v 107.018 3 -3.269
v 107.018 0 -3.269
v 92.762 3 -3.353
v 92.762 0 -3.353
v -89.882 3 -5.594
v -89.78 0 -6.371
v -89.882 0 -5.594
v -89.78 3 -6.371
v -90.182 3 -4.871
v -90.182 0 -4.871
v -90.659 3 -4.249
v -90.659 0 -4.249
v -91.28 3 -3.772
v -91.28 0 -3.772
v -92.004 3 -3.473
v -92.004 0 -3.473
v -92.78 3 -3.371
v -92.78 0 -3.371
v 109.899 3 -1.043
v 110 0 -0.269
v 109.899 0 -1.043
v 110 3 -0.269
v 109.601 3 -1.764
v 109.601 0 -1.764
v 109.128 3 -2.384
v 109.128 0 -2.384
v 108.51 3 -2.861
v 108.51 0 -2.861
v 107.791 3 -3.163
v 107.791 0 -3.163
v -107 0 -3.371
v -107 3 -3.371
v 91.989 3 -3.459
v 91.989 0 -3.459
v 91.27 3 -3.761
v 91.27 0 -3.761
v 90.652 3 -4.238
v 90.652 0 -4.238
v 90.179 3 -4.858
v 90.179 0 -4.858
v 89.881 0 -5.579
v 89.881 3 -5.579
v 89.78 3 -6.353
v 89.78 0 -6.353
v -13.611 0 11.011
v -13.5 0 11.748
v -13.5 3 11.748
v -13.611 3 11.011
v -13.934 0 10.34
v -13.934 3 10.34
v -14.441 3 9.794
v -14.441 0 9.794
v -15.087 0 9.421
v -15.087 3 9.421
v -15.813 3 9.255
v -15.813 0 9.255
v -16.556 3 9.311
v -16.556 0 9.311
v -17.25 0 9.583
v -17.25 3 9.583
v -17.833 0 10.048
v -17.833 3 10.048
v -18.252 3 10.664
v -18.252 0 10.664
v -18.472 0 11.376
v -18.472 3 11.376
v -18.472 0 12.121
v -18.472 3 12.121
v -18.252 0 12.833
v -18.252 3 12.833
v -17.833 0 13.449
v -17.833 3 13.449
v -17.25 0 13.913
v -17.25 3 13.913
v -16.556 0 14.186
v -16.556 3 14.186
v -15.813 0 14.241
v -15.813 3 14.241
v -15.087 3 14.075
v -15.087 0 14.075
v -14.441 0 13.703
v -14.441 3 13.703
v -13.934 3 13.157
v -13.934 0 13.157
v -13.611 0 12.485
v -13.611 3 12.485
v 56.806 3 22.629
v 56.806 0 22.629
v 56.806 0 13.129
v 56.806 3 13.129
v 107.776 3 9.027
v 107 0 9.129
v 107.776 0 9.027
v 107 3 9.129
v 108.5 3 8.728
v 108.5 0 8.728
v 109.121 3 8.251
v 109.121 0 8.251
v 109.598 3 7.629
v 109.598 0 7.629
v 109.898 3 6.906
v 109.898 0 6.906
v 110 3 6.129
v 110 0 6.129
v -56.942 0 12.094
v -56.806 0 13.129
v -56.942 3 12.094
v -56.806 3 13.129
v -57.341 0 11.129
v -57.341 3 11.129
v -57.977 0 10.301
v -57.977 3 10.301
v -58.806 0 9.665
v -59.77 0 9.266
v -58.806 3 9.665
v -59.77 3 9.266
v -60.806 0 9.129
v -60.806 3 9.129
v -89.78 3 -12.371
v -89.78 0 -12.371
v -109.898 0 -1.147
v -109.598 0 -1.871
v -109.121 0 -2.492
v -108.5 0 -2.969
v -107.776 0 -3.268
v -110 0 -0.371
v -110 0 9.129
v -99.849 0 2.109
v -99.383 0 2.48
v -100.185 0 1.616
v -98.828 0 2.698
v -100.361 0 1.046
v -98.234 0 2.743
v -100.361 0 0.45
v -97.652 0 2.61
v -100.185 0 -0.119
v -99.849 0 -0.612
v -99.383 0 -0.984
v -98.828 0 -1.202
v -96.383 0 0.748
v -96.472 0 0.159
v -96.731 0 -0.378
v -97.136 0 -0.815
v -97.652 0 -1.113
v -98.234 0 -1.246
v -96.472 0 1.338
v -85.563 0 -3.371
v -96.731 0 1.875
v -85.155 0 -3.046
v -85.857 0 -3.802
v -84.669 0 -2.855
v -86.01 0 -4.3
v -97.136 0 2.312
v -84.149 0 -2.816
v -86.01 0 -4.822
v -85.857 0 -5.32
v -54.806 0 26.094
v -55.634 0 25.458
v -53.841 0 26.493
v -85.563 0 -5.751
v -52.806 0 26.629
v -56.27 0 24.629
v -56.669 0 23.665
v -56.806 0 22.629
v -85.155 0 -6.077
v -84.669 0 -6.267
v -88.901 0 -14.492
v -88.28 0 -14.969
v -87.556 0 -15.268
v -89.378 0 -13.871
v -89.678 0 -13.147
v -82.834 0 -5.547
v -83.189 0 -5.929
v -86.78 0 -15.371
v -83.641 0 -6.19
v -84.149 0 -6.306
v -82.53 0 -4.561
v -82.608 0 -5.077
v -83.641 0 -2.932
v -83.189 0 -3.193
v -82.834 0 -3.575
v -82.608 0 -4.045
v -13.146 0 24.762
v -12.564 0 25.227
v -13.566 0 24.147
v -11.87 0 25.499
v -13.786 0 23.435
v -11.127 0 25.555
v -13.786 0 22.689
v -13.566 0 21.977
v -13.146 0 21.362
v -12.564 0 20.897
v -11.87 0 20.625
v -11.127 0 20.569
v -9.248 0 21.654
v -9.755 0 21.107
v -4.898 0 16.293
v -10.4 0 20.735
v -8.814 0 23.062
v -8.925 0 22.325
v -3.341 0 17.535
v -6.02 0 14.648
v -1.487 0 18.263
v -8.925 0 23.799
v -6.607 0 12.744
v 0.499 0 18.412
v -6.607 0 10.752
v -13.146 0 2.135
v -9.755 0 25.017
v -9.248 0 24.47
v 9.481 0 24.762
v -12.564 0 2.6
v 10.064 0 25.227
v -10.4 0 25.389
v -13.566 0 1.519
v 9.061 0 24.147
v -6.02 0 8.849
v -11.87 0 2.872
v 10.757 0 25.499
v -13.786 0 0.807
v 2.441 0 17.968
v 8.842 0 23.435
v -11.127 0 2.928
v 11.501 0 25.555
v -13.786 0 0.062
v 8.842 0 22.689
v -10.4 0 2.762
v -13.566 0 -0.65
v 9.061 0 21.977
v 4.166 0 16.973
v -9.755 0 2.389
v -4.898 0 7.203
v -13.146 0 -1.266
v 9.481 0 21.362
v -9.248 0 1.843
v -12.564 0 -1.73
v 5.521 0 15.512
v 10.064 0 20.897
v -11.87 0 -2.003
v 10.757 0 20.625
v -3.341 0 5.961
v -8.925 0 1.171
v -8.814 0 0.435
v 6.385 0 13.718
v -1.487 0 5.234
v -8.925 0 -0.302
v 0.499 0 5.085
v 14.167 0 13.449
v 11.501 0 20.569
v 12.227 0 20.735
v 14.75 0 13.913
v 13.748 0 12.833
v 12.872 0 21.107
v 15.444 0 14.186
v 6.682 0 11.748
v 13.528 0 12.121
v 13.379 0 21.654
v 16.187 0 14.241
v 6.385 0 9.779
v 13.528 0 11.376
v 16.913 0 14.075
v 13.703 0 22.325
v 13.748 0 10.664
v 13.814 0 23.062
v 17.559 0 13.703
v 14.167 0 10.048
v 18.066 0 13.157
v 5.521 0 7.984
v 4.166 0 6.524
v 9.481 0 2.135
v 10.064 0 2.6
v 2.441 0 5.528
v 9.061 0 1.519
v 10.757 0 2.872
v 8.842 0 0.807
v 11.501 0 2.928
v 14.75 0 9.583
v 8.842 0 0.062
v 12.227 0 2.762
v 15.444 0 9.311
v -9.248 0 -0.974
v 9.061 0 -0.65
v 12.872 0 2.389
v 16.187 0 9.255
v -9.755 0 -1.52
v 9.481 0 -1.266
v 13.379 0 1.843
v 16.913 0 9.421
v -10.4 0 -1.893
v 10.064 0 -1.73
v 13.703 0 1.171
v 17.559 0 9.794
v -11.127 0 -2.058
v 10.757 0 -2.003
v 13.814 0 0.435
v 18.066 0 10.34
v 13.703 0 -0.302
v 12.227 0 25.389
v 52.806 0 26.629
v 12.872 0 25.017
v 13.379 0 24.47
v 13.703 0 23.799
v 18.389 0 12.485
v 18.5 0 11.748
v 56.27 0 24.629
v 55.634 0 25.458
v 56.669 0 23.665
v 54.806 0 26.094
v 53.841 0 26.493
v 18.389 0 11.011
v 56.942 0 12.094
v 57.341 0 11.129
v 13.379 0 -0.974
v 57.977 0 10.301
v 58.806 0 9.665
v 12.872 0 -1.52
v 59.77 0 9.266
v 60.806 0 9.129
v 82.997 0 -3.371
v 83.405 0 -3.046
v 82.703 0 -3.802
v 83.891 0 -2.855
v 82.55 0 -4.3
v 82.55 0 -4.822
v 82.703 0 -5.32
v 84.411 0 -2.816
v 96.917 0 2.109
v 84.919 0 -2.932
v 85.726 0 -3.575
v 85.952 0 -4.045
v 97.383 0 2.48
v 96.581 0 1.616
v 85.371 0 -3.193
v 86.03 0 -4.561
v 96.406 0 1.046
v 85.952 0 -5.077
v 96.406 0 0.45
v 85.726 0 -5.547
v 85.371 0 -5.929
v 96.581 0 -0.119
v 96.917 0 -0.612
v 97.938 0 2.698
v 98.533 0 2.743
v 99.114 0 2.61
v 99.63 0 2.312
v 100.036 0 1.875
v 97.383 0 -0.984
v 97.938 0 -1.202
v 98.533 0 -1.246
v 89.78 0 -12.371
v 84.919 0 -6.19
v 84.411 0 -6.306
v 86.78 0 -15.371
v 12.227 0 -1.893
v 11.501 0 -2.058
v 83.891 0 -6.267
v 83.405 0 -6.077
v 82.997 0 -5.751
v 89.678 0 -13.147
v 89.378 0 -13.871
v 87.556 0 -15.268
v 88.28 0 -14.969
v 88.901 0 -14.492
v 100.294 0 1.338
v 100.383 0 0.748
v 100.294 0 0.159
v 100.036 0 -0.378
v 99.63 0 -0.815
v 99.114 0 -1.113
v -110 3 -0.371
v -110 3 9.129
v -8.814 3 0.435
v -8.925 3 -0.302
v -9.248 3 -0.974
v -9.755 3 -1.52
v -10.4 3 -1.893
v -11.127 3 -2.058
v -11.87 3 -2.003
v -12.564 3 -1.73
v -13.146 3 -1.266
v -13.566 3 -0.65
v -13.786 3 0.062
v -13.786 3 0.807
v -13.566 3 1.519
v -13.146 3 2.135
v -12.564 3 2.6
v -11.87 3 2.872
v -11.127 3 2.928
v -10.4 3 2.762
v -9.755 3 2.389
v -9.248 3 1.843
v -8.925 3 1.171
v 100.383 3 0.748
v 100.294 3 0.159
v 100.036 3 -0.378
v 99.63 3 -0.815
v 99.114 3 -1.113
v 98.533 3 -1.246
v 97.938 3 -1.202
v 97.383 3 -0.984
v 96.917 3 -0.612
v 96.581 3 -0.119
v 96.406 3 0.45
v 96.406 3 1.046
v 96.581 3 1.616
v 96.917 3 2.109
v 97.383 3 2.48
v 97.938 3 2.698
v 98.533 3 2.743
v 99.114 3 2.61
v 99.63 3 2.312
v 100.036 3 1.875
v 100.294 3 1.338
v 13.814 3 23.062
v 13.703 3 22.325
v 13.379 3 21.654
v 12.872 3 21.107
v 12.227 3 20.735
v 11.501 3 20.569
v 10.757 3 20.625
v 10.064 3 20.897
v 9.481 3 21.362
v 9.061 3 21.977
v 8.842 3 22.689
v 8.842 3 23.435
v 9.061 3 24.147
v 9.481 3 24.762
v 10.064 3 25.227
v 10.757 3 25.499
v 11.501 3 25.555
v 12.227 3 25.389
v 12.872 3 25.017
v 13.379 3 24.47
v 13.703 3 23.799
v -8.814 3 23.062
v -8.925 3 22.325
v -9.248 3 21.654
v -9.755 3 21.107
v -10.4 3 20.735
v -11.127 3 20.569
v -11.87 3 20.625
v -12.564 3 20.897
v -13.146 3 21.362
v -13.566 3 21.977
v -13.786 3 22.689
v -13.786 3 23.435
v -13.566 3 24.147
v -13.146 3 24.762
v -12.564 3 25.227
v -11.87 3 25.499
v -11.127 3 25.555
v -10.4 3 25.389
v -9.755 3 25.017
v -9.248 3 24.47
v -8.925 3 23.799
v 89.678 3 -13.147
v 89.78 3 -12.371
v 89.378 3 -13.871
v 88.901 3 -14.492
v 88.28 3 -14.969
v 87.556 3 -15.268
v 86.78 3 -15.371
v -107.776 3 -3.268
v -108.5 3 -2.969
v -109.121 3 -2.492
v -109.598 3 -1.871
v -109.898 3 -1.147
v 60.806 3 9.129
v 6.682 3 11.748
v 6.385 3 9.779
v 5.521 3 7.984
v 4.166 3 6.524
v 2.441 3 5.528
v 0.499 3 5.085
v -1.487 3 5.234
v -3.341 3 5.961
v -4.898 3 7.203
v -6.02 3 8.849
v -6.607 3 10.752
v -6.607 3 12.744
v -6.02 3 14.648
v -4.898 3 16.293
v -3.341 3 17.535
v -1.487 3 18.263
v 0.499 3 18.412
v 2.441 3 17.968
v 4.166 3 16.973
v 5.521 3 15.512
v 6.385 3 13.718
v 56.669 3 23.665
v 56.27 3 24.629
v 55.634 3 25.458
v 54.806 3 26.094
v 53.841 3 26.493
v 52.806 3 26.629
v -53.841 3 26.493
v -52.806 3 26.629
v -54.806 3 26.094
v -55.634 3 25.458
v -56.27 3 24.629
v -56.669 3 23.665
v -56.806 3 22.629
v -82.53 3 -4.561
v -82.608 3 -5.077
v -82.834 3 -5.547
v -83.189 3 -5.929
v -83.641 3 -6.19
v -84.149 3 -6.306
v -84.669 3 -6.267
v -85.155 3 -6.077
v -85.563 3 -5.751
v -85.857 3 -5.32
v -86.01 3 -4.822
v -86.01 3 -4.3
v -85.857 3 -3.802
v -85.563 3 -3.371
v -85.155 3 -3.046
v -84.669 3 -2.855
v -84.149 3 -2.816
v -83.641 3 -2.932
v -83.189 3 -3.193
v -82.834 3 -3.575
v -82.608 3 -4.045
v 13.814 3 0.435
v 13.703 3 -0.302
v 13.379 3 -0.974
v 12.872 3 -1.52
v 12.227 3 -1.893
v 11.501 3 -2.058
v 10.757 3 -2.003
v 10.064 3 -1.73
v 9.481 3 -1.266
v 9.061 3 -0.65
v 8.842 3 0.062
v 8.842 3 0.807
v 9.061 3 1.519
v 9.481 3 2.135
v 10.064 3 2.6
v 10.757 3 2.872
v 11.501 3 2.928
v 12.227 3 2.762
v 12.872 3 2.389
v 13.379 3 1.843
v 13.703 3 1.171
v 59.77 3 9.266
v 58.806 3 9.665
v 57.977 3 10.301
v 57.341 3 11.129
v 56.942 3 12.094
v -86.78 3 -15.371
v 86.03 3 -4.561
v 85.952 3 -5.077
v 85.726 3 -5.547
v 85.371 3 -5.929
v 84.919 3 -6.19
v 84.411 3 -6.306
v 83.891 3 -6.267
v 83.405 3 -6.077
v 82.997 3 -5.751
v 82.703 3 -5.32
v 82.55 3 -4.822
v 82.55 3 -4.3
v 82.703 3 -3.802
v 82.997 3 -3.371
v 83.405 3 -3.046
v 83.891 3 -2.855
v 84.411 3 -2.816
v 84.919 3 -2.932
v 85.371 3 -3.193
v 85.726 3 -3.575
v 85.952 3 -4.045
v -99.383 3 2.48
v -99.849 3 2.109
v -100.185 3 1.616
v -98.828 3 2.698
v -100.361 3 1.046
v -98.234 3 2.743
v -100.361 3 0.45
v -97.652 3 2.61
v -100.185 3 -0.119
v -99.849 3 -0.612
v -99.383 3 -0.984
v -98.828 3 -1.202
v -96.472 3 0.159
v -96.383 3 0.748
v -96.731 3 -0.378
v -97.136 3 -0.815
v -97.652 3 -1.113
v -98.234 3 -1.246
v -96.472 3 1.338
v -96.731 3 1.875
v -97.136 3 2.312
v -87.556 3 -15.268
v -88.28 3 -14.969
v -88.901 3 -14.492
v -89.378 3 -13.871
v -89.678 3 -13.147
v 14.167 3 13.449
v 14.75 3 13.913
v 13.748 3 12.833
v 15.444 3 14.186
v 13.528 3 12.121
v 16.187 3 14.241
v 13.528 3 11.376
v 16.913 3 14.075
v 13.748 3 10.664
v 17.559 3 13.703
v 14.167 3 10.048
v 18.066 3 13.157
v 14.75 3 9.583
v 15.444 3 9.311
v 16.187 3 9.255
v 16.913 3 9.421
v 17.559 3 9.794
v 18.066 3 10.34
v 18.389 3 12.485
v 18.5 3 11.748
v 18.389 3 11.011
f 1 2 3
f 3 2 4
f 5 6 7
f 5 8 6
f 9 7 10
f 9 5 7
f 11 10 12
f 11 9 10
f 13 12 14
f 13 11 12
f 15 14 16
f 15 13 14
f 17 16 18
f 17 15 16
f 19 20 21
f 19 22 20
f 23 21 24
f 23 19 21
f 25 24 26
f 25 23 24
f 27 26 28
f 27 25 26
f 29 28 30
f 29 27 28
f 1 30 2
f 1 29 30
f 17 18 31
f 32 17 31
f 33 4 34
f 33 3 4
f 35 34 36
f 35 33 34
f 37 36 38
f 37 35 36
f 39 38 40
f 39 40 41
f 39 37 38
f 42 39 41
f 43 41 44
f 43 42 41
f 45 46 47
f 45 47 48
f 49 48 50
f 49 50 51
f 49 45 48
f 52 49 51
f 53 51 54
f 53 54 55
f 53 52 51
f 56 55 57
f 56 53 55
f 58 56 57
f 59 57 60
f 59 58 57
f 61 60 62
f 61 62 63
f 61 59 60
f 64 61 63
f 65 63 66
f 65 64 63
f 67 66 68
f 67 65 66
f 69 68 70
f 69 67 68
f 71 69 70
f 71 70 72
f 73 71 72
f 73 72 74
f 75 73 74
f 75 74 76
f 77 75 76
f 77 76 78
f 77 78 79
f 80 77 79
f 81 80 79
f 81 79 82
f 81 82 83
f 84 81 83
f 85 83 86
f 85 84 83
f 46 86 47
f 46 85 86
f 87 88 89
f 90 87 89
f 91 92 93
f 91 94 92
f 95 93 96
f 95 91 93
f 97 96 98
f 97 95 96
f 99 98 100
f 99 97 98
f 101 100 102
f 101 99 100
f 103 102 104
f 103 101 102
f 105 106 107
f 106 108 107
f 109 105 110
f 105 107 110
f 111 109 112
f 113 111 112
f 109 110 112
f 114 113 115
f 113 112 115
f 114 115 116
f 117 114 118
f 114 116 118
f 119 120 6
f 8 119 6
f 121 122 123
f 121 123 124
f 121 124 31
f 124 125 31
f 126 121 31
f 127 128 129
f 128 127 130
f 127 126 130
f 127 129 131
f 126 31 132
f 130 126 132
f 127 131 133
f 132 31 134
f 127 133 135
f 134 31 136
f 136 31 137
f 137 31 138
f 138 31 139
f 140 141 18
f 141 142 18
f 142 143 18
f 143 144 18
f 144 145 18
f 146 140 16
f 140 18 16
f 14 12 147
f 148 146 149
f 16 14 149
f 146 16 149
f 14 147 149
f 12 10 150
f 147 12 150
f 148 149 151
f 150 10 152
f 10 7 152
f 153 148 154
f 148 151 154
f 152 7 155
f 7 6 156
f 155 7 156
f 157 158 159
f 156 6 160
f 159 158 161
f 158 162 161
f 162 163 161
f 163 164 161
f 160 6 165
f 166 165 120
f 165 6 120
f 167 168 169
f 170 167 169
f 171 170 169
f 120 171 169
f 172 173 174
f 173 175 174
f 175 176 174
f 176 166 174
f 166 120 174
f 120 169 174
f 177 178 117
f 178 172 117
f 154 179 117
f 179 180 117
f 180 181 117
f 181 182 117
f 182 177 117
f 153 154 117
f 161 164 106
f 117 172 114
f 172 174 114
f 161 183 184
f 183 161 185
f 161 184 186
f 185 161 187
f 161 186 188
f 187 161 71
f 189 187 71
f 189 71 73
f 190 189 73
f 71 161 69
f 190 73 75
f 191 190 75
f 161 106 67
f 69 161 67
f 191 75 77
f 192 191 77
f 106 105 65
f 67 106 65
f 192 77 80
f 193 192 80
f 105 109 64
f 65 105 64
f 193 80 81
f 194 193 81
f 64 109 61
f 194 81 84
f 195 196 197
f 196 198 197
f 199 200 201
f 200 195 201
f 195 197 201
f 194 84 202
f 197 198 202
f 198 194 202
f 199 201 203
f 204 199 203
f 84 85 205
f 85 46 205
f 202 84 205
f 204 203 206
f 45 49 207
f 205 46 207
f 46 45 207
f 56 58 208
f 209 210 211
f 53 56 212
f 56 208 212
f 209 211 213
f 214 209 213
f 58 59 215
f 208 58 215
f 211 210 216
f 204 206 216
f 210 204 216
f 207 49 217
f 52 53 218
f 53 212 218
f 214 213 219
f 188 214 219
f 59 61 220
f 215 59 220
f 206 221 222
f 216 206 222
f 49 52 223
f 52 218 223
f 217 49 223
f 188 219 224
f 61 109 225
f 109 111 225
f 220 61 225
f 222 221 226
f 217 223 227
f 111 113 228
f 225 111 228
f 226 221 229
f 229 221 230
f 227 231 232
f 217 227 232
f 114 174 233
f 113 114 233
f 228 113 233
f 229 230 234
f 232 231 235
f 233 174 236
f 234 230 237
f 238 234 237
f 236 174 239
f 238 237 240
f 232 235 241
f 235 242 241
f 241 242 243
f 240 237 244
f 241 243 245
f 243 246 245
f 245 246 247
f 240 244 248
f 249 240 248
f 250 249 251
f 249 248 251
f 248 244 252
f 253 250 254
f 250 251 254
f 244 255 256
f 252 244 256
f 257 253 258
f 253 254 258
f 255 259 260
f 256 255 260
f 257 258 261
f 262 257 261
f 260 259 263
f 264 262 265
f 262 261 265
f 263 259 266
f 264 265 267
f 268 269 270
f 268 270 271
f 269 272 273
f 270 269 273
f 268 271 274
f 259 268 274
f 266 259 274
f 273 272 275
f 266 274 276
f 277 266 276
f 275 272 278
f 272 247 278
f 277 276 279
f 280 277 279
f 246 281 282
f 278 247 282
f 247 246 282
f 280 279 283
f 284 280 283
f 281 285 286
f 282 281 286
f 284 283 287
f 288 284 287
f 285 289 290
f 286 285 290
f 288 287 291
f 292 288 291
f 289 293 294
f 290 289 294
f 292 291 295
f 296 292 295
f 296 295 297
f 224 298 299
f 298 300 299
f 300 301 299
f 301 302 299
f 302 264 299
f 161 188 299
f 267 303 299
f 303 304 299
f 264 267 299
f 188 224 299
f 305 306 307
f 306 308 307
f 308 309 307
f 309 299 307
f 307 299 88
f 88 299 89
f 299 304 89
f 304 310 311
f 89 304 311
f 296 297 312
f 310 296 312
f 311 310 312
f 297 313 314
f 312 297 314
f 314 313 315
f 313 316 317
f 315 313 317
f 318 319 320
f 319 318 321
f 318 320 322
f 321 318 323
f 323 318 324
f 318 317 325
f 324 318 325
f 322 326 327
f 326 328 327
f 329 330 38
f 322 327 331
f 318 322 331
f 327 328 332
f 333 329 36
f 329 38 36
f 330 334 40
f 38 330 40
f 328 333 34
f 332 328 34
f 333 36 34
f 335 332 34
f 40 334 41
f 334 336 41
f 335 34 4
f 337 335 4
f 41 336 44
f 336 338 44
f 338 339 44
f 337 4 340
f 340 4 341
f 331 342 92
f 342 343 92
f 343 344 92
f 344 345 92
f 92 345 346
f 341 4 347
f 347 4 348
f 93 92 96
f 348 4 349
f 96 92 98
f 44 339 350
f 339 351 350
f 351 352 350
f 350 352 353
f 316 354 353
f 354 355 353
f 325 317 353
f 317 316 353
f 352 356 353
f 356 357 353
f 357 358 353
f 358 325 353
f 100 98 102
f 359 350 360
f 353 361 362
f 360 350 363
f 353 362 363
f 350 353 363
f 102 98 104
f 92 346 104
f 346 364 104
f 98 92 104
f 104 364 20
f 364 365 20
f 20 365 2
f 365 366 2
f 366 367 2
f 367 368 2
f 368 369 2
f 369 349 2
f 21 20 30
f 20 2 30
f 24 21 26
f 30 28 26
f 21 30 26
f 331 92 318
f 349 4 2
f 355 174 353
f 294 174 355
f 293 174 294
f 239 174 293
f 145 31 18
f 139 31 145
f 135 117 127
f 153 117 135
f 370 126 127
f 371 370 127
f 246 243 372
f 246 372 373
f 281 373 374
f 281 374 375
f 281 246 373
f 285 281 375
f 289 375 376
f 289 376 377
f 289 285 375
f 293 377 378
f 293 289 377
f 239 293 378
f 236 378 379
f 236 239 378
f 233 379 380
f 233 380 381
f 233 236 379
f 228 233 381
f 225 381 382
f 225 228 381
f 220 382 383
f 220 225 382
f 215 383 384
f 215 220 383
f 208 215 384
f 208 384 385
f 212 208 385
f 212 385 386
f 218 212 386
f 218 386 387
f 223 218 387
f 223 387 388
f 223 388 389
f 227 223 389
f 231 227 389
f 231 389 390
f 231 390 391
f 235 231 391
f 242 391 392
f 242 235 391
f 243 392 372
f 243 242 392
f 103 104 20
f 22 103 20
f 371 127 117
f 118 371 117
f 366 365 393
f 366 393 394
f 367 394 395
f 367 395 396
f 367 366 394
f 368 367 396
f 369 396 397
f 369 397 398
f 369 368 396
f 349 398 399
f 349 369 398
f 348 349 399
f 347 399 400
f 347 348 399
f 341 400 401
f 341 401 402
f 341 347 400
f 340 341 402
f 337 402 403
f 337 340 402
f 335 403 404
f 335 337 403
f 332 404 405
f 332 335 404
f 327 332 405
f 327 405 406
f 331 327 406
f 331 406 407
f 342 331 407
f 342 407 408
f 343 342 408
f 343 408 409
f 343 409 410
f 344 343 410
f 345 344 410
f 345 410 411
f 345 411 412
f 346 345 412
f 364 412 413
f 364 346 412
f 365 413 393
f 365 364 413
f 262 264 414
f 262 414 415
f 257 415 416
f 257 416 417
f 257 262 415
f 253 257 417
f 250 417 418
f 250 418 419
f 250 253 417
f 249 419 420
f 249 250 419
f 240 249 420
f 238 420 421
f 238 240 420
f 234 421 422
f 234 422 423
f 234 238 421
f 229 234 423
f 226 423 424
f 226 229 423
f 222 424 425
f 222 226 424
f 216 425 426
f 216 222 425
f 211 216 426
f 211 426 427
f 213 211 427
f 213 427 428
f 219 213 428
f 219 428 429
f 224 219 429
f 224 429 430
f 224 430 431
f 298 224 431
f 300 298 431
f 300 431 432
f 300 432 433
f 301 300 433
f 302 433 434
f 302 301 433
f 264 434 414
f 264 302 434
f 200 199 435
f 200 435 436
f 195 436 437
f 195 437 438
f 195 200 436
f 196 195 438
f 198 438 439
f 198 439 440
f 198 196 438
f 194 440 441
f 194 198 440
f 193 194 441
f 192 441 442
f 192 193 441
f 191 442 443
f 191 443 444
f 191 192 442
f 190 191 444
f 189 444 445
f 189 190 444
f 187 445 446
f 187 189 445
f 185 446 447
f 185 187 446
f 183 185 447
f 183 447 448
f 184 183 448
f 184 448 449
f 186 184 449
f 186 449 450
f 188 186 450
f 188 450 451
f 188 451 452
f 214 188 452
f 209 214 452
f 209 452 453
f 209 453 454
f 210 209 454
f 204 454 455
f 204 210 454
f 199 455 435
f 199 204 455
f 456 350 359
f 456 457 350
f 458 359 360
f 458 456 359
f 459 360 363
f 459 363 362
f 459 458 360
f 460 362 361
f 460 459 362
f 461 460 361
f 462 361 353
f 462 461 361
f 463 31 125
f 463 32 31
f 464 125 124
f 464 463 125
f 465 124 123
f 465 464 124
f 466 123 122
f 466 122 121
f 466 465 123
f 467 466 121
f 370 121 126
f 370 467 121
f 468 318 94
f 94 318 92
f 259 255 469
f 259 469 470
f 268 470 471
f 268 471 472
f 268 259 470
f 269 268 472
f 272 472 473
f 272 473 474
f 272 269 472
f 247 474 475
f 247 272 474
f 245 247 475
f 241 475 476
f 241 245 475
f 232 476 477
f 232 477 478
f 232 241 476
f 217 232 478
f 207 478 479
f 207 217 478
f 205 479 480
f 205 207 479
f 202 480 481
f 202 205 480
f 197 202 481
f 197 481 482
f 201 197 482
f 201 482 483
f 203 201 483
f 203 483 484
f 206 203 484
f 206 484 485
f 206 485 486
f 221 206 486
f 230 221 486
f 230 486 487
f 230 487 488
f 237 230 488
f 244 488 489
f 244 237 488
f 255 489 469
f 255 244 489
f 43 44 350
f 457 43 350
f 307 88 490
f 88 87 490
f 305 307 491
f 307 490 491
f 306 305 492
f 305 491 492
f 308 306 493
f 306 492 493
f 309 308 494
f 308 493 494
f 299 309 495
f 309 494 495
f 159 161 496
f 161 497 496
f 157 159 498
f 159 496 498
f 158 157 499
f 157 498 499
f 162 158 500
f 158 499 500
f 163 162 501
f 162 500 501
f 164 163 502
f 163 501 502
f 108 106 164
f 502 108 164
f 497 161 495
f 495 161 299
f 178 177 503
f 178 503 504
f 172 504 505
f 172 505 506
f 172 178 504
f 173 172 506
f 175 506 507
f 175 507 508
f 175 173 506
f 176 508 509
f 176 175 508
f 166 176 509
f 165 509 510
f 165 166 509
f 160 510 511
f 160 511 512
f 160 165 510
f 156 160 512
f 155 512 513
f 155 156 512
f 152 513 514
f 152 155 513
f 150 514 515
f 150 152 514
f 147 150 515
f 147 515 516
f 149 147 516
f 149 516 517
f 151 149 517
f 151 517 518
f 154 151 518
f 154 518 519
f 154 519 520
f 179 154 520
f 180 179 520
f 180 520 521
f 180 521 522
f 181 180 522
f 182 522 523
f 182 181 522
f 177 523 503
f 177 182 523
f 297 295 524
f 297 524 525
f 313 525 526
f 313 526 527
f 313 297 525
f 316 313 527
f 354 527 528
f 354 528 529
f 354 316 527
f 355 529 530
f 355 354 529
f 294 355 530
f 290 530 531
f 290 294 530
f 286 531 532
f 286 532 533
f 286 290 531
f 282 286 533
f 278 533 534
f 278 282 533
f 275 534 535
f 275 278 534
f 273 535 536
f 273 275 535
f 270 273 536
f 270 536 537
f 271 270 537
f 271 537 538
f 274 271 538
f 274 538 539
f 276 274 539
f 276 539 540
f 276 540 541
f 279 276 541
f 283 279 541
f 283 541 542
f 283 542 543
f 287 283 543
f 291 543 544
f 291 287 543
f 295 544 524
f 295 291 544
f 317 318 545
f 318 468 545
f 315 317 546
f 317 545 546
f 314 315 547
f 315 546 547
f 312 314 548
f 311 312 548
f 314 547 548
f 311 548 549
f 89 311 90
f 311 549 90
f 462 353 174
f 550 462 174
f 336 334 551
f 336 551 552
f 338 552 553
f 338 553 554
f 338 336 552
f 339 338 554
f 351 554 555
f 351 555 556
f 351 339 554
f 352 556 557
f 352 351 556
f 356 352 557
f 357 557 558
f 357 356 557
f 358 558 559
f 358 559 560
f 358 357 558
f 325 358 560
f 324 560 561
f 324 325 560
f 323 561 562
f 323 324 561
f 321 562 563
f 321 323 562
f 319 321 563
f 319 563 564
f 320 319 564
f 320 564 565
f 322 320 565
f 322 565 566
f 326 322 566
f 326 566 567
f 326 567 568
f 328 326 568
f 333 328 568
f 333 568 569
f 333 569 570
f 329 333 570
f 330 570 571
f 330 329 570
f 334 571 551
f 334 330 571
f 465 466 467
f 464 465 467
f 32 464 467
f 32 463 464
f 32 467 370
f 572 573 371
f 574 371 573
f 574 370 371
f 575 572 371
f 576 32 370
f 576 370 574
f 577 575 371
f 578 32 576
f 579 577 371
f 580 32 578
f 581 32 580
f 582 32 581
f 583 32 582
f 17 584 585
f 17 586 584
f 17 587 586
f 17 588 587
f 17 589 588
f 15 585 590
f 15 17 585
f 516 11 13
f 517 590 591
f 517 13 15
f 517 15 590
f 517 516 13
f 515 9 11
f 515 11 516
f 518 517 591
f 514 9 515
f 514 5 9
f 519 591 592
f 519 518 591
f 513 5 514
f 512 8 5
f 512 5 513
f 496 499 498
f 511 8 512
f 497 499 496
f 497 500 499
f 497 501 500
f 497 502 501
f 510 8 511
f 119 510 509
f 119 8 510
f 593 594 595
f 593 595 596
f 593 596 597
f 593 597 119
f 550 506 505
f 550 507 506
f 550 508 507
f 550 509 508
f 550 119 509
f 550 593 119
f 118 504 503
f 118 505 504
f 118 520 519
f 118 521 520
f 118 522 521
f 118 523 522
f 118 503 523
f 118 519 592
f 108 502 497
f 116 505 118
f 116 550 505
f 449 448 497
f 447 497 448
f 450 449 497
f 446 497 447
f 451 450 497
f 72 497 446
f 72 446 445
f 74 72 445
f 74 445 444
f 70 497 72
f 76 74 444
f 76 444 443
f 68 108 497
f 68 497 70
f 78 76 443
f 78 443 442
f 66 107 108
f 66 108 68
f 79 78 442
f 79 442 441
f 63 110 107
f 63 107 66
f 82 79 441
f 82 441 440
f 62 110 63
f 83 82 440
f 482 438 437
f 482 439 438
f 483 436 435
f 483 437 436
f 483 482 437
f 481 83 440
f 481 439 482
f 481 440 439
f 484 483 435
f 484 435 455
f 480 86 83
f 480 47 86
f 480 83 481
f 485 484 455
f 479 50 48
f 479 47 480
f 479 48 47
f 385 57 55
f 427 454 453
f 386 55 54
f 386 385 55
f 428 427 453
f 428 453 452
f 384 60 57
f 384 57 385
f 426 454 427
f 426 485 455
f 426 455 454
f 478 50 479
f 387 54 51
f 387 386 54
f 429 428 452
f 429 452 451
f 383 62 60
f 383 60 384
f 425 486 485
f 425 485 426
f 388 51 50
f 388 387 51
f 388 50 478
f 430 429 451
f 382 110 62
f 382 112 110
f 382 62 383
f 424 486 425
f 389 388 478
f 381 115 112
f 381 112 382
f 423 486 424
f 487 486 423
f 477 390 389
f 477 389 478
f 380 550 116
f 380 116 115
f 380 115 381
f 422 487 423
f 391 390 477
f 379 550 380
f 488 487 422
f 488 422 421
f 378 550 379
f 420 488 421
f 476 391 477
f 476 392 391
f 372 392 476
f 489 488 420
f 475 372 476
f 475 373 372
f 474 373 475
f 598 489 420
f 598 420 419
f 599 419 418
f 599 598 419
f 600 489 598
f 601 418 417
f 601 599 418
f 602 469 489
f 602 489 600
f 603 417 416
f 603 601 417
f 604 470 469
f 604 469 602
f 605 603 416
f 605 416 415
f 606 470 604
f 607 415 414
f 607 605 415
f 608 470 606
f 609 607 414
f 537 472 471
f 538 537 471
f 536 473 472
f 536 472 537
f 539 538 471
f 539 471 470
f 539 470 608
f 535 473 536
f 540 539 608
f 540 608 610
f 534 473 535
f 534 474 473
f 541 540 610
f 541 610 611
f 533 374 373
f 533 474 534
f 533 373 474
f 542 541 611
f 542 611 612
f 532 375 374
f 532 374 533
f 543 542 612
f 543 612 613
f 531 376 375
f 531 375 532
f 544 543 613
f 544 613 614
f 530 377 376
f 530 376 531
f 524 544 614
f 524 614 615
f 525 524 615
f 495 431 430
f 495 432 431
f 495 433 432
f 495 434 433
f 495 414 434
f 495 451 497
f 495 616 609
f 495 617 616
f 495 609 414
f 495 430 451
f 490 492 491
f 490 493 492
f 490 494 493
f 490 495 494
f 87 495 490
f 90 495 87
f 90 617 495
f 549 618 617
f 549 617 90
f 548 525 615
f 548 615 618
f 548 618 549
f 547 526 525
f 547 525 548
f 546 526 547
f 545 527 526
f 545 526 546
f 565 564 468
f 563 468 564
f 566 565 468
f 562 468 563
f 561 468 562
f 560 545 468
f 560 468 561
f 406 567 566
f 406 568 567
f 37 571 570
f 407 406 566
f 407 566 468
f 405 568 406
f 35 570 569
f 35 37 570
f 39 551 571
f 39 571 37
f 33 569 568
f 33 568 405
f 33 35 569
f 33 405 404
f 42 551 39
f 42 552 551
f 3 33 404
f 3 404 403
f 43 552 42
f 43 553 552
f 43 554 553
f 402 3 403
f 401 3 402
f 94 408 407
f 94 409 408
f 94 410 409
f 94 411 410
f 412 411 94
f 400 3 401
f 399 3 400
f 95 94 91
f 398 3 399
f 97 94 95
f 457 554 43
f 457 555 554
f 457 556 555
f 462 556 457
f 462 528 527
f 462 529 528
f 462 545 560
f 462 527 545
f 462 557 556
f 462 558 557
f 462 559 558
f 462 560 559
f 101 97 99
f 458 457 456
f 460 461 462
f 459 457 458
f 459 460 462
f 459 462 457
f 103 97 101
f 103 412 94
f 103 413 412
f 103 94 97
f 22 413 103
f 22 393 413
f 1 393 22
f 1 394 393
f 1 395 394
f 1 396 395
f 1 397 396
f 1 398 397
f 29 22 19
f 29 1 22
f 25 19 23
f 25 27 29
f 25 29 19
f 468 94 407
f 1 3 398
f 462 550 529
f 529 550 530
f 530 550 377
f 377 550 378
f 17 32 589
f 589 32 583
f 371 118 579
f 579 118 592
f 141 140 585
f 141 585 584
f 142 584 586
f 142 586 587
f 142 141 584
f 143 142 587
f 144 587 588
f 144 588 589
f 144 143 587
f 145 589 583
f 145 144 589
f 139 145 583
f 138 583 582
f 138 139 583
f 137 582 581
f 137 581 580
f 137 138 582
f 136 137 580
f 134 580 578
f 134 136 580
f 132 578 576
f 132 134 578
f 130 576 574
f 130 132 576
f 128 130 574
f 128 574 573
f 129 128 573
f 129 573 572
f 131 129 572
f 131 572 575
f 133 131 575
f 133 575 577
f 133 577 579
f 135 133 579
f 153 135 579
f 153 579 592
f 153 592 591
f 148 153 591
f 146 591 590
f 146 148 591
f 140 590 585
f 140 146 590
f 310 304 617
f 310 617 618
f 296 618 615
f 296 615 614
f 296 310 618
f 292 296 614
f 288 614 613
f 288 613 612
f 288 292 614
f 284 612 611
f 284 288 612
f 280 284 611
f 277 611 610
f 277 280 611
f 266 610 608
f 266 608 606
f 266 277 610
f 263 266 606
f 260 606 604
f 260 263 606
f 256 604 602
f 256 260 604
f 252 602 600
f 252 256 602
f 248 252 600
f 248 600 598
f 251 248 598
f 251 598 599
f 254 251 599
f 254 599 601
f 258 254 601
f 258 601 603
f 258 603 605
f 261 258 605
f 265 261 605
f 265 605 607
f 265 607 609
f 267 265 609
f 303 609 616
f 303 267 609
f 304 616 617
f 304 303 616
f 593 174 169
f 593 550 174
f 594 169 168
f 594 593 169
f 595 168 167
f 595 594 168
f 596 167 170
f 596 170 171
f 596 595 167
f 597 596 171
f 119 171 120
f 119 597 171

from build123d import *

# Parameters (mm, degrees)
SKETCH_2_R      = 2.5
SKETCH_2_R_2    = 2.499999999
SKETCH_2_R_3    = 6.682030953
SKETCH_2_R_4    = 2
SKETCH_2_R_5    = 1.75
EXTRUDE_1_DEPTH = 3
FILLET_1_R      = 4
FILLET_2_R      = 3


with BuildPart() as part:
    # 草图2 → 凸台-拉伸1 (new body)
    with BuildSketch(Plane(origin=(0, 0, 0), x_dir=(1, 0, 0), z_dir=(0, 1, 0))):
        Polygon((56.805521657, -9.129480985), (110, -9.129480985), (110, 3.251695679), (89.78, 3.370519015), (89.78, 15.370519015), (-89.78, 15.370519015), (-89.78, 3.370519015), (-110, 3.370519015), (-110, -9.129480985), (-56.805521657, -9.129480985), (-56.805521657, -26.629480985), (56.805521657, -26.629480985), align=None)
        with Locations((-16.000000001, -11.748304322)):
            Circle(SKETCH_2_R, mode=Mode.SUBTRACT)
        with Locations((-11.313708499, -23.062012821)):
            Circle(SKETCH_2_R_2, mode=Mode.SUBTRACT)
        with Locations((-11.3137085, -0.434595823)):
            Circle(SKETCH_2_R, mode=Mode.SUBTRACT)
        with Locations((0, -11.748304321)):
            Circle(SKETCH_2_R_3, mode=Mode.SUBTRACT)
        with Locations((11.313708498, -0.434595822)):
            Circle(SKETCH_2_R, mode=Mode.SUBTRACT)
        with Locations((16, -11.748304321)):
            Circle(SKETCH_2_R, mode=Mode.SUBTRACT)
        with Locations((11.313708499, -23.062012821)):
            Circle(SKETCH_2_R_2, mode=Mode.SUBTRACT)
        with Locations((98.383175919, -0.748304322)):
            Circle(SKETCH_2_R_4, mode=Mode.SUBTRACT)
        with Locations((84.28, 4.561107346)):
            Circle(SKETCH_2_R_5, mode=Mode.SUBTRACT)
        with Locations((-84.280000001, 4.561107346)):
            Circle(SKETCH_2_R_5, mode=Mode.SUBTRACT)
        with Locations((-98.38317592, -0.748304322)):
            Circle(SKETCH_2_R_4, mode=Mode.SUBTRACT)
    extrude(amount=EXTRUDE_1_DEPTH)

    # 圆角1
    fillet_1_edges = [part.edges().sort_by_distance(p)[0] for p in [
        (56.805521657, 1.5, 9.129480985),
        (56.805521657, 1.5, 26.629480985),
        (-56.805521657, 1.5, 26.629480985),
        (-56.805521657, 1.5, 9.129480985),
    ]]
    fillet(fillet_1_edges, radius=FILLET_1_R)

    # 圆角2
    fillet_2_edges = [part.edges().sort_by_distance(p)[0] for p in [
        (89.78, 1.5, -3.370519015),
        (110, 1.5, -3.251695679),
        (110, 1.5, 9.129480985),
        (-110, 1.5, -3.370519015),
        (-89.78, 1.5, -3.370519015),
        (-89.78, 1.5, -15.370519015),
        (89.78, 1.5, -15.370519015),
    ]]
    fillet(fillet_2_edges, radius=FILLET_2_R)


solid = part.part
